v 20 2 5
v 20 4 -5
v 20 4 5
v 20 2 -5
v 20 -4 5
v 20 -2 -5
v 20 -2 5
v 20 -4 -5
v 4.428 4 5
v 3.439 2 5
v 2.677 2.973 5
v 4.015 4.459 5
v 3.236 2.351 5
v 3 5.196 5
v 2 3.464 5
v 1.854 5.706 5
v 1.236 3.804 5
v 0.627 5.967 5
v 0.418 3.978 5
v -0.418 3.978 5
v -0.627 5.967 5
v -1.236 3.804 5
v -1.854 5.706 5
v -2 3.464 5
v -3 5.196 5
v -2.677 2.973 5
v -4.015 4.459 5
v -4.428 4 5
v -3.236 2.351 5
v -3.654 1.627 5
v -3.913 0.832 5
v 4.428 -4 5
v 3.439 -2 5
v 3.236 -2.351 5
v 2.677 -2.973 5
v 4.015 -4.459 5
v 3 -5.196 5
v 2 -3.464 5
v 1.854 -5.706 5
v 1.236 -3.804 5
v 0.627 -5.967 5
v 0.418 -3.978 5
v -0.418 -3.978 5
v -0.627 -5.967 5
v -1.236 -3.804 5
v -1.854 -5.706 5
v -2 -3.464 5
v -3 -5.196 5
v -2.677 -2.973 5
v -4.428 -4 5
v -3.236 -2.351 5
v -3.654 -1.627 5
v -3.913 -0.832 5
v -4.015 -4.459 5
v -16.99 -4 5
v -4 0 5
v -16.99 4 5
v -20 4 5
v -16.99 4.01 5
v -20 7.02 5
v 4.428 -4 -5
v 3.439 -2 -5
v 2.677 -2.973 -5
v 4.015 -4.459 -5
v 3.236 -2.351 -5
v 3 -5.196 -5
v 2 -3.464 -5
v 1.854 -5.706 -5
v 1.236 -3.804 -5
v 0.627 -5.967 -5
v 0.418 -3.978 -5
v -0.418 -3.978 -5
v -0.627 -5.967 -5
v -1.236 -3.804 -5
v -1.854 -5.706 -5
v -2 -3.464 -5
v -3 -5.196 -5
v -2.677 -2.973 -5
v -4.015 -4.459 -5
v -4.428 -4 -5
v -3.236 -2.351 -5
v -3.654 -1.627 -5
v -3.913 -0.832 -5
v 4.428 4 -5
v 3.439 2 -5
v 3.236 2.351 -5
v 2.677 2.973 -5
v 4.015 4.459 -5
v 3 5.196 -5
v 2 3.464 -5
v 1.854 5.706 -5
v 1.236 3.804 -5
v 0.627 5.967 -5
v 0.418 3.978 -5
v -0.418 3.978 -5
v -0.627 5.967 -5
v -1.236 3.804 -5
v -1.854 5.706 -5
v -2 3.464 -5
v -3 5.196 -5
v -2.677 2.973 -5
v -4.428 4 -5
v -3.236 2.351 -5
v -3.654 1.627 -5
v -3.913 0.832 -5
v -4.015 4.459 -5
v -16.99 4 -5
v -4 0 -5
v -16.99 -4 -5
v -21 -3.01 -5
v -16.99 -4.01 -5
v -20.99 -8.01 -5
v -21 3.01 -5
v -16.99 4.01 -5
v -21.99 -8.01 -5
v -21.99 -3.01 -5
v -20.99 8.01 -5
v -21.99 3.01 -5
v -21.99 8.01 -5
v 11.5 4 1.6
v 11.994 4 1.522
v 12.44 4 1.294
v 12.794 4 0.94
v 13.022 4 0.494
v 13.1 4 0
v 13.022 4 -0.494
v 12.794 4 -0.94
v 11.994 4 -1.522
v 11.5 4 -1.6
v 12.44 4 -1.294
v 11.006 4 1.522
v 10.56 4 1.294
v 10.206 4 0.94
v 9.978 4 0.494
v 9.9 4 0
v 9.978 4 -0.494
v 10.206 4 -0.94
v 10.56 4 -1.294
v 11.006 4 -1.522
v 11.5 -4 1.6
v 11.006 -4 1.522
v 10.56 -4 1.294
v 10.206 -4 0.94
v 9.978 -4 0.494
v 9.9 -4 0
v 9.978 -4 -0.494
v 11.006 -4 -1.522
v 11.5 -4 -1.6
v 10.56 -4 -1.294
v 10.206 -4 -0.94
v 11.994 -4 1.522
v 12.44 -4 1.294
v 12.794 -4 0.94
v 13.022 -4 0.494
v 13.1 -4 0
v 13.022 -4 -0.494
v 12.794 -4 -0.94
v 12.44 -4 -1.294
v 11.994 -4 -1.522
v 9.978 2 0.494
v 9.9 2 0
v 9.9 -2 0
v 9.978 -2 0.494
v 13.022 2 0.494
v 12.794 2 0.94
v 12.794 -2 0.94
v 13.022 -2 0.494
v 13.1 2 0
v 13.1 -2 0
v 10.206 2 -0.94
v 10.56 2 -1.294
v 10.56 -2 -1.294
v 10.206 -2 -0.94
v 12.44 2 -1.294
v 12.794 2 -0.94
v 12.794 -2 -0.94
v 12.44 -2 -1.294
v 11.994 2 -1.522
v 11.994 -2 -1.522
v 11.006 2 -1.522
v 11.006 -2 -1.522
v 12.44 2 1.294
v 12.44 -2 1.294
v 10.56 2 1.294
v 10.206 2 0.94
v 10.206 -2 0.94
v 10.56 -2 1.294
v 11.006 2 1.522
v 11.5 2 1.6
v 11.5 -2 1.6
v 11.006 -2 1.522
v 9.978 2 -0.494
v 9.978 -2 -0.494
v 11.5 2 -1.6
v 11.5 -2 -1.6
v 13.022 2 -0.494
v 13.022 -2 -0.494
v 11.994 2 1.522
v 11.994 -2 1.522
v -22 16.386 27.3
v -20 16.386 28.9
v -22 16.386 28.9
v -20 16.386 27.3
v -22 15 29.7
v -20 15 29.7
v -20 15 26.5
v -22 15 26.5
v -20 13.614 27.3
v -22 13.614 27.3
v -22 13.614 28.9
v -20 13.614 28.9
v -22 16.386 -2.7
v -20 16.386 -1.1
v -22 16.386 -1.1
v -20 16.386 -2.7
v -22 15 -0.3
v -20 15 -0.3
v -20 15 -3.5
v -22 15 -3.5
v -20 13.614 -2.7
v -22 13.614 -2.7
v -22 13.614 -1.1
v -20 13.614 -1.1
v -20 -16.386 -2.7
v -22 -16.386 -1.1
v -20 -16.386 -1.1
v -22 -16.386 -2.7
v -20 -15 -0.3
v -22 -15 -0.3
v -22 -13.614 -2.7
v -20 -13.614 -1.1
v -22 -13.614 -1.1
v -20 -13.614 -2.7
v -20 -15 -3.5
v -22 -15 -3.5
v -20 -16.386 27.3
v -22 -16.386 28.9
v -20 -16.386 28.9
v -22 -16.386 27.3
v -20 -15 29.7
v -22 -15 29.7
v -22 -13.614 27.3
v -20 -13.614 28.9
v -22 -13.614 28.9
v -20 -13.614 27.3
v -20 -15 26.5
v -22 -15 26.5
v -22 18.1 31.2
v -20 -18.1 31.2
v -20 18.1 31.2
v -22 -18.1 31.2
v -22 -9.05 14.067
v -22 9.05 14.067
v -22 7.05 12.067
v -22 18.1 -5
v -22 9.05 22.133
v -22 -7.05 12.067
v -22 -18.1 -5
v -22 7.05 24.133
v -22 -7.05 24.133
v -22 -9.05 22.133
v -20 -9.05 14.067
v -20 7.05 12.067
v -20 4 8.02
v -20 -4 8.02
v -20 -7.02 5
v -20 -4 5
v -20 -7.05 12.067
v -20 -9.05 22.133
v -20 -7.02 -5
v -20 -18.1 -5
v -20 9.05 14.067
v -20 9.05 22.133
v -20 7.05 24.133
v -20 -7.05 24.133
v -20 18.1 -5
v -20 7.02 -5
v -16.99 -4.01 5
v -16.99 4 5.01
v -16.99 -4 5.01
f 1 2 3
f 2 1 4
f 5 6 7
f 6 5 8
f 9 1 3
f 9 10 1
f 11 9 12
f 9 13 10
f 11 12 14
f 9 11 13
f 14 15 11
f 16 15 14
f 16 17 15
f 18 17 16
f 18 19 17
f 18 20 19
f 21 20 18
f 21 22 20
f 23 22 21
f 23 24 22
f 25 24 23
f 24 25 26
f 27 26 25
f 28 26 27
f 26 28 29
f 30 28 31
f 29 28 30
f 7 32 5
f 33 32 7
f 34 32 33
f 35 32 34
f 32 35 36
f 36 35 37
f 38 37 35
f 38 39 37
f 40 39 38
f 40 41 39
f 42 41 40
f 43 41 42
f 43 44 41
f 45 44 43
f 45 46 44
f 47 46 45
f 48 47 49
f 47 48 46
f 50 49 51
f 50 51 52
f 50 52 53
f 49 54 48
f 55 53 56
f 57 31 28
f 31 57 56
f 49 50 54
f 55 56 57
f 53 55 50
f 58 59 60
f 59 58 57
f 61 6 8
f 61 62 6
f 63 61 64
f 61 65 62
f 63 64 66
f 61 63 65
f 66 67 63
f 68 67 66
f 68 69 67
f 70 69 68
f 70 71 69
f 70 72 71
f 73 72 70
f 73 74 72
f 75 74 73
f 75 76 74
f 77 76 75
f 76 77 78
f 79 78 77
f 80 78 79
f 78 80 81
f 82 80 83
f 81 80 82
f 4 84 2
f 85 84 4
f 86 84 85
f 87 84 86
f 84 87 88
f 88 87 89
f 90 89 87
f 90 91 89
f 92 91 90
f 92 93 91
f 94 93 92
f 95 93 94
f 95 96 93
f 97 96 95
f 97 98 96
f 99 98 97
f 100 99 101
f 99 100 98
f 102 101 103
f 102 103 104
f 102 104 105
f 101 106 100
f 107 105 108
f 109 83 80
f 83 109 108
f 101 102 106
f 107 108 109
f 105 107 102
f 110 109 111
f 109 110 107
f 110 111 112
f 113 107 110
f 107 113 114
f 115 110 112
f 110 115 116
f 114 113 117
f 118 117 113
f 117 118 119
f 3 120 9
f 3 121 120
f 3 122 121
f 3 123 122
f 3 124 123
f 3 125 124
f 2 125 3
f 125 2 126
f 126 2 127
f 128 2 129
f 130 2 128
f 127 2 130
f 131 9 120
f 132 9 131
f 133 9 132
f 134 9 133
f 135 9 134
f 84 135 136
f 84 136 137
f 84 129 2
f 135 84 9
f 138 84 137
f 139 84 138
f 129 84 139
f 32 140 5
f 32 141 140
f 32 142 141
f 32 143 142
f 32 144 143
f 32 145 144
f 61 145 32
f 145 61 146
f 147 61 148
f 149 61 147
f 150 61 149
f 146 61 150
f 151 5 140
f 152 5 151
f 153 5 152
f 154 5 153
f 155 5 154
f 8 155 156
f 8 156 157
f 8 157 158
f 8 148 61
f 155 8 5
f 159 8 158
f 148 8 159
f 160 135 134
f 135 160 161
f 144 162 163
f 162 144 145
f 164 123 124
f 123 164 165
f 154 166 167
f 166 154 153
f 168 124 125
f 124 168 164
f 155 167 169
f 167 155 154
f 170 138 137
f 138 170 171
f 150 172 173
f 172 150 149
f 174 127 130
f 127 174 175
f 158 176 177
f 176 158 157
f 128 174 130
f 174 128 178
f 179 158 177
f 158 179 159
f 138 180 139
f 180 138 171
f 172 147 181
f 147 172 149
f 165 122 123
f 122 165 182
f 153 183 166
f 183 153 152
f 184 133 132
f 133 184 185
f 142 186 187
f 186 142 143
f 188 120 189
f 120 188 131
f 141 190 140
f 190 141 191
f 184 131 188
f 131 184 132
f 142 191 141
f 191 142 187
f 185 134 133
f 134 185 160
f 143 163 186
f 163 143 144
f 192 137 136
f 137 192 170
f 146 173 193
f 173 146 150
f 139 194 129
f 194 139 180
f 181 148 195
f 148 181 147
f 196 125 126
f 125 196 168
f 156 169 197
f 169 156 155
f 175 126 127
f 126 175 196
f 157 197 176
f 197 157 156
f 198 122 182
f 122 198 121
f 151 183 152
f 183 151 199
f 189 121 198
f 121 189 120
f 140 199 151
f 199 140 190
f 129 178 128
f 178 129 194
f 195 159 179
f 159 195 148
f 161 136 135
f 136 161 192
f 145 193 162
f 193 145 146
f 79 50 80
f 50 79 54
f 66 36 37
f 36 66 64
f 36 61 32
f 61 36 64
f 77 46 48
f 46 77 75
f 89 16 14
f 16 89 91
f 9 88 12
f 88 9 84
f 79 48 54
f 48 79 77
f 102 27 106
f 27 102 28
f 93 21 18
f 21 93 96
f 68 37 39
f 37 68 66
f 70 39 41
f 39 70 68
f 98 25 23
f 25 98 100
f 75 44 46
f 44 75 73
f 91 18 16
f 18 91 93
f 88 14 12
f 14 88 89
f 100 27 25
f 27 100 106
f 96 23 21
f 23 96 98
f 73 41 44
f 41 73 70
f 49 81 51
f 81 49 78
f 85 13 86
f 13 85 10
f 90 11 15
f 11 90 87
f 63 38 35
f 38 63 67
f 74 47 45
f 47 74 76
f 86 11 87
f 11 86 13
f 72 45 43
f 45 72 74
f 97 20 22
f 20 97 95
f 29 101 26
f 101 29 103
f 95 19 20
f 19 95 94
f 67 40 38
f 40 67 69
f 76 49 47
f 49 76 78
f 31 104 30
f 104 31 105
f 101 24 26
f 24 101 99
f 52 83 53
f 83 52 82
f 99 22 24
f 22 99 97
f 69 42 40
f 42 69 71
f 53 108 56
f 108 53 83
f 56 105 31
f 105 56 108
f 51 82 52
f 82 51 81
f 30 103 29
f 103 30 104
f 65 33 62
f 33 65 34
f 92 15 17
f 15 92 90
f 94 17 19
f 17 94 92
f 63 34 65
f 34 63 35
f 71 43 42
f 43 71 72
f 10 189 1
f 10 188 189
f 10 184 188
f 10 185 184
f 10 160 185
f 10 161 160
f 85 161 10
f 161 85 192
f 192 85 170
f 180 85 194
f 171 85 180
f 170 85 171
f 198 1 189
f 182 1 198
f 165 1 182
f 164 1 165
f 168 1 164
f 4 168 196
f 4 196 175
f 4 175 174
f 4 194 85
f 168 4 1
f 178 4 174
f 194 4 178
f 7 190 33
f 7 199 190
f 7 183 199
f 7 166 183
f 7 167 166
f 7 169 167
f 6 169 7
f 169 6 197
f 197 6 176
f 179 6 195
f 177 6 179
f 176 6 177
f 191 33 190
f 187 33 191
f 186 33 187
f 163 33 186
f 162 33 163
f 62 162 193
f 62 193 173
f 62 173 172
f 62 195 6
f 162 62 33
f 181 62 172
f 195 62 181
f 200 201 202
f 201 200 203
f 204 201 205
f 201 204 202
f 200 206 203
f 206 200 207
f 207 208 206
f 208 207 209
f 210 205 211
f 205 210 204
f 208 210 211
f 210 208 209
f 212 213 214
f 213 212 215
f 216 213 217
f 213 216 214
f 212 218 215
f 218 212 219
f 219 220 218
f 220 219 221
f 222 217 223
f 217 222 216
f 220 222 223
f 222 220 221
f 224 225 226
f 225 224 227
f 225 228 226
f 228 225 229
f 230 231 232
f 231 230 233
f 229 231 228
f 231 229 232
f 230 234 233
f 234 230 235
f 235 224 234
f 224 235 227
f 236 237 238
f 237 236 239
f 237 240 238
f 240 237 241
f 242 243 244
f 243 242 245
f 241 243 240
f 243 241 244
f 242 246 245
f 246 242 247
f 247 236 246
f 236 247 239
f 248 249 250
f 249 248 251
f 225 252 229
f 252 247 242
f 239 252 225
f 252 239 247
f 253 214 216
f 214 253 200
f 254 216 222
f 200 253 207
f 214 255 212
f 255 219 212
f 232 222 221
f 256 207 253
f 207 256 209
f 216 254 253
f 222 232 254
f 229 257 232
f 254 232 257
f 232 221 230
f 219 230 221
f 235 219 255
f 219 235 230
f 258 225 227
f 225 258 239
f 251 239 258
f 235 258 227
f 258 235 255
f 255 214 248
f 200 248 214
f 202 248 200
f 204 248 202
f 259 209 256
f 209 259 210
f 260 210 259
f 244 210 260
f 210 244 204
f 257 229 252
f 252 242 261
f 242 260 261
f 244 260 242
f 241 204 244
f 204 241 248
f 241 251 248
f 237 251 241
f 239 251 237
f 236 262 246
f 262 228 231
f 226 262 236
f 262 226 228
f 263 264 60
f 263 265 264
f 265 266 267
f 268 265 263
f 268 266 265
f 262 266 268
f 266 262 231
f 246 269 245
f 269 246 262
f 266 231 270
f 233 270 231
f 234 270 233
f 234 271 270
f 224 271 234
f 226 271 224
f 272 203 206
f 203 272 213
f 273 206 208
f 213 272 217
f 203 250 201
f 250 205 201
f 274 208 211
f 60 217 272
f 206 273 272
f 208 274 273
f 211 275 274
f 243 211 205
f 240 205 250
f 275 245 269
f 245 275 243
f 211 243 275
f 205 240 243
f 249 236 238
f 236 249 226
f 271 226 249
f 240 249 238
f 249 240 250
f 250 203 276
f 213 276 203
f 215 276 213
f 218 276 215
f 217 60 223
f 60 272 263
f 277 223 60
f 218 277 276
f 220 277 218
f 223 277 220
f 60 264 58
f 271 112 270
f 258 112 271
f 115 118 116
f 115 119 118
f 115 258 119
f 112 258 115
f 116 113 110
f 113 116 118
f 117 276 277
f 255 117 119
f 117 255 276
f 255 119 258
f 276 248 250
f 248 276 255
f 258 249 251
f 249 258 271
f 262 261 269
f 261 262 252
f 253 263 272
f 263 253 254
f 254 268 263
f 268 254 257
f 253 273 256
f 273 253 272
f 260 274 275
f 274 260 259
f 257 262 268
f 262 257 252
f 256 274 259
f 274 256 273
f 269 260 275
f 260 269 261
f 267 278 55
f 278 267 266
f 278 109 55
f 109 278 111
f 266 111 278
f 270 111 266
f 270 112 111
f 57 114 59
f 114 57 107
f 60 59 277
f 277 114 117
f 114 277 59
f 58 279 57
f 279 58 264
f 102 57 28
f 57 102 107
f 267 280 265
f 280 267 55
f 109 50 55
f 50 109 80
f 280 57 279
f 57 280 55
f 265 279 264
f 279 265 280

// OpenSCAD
// file: obiscad/attach.scad
//---------------------------------------------------------------
//-- Openscad Attachment library
//-- Attach parts easily. Make your designs more reusable and clean
//---------------------------------------------------------------
//-- This is a component of the obiscad opescad tools by Obijuan
//-- (C) Juan Gonzalez-Gomez (Obijuan)
//-- Sep-2012
//---------------------------------------------------------------
//-- Released under the GPL license
//---------------------------------------------------------------

use <vector.scad>

//--------------------------------------------------------------------
//-- Draw a connector
//-- A connector is defined a 3-tuple that consist of a point
//--- (the attachment point), and axis (the attachment axis) and
//--- an angle the connected part should be rotate around the 
//--  attachment axis
//--
//--- Input parameters:
//--
//--  Connector c = [p , n, ang] where:
//--
//--     p : The attachment point
//--     v : The attachment axis
//--   ang : the angle
//--------------------------------------------------------------------
module connector(c)
{
  //-- Get the three components from the connector
  p = c[0];
  v = c[1];
  ang = c[2];

  //-- Draw the attachment poing
  color("Gray") point(p);

  //-- Draw the attachment axis vector (with a mark)
  translate(p)
    rotate(a=ang, v=v)
    color("Gray") vector(unitv(v)*6, l_arrow=2, mark=true);
}


//-------------------------------------------------------------------------
//--  ATTACH OPERATOR
//--  This operator applies the necesary transformations to the 
//--  child (attachable part) so that it is attached to the main part
//--  
//--  Parameters
//--    a -> Connector of the main part
//--    b -> Connector of the attachable part
//-------------------------------------------------------------------------
module attach(a,b)
{
  //-- Get the data from the connectors
  pos1 = a[0];  //-- Attachment point. Main part
  v    = a[1];  //-- Attachment axis. Main part
  roll = a[2];  //-- Rolling angle
  
  pos2 = b[0];  //-- Attachment point. Attachable part
  vref = b[1];  //-- Atachment axis. Attachable part
                //-- The rolling angle of the attachable part is not used

  //-------- Calculations for the "orientate operator"------
  //-- Calculate the rotation axis
  raxis = cross(vref,v);
    
  //-- Calculate the angle between the vectors
  ang = anglev(vref,v);
  //--------------------------------------------------------.-

  //-- Apply the transformations to the child ---------------------------

  //-- Place the attachable part on the main part attachment point
  translate(pos1)
    //-- Orientate operator. Apply the orientation so that
    //-- both attachment axis are paralell. Also apply the roll angle
    rotate(a=roll, v=v)  rotate(a=ang, v=raxis)
      //-- Attachable part to the origin
      translate(-pos2)
	child(0); 
}


//--------------------------------------------------------------------
//---   An example of the attach operator
//---  
//---  There are two parts: the main body and an arm
//---  They both are cubes (for simplicity)
//---
//--   In the main body there are 2 connectors defined, so that
//--  the arm can be attached to any of them (or both if you like)
//------------------------------------------------------------------

//-- In the debug mode the connectors and additional information
//-- are shown
debug=true;

//-- Define the Main part: A cube
//-- Two attachment points are defined: one on the top, another in the
//--- left side
size = [10,10,10];

//-- Connectors defined:

//--     Att. point       Att. Axis  Roll
c1 = [ [0,0,size[2]/2],  [0,0,1],     20];  //-- Connector on the top
c2 = [ [-size[0]/2,0,0], [-1,0,0],    90];  //-- Connector on the left


//-- Draw the main part along with the connectors (for debugging)
cube(size,center=true);

//-- In debug mode: Draw the main part connectors!
if (debug) {
  connector(c1);
  connector(c2);
}

//-- Define the Attachable part. It is another cube, with one connector
asize = [5,20,3];
a = [ [0,asize[1]/2-3,-asize[2]/2], [0,0,1], 0  ];


//-- Do the attach!
//-- Just change c1 by c2 to attach the part to the other 
//-- connector. Super-easy!! :-)
//-- Modify the c1 and c2 roll angle for rotating the attachable
//--  part to the desired orientation
attach(c1,a)
  //-- This is the attachable part! 
  union() {
    cube(asize,center=true);  //-- The part

    //-- In debug mode show additional info:
    if (debug) {
      frame(l=10);    //-- The part frame of reference.
      connector(a);   //-- Show the part connector
    }
  };

  
// file: obiscad/bcube.scad
//------------------------------------------------------------------------------
//  Bevel edge cube.
//  (c) Juan Gonzalez-Gomez (Obijuan), Sep-2012
//------------------------------------------------------------------------------

//----------------- IMPLEMENTATION USING THE MINKOWSKI OPERATOR ----------------

//------------------------------------------------------------------------------
//-- Bevel Cube main function
//-- Parameters:
//--   * Size:  Cube size
//--   * cr : Corner radius (if cr==0, a standar cube is built)
//--   * cres:  Corner resolution (in points). cres=0 means flat corners
//------------------------------------------------------------------------------
module bcube(size,cr=0,cres=0)
{
  //-- Internal cube size
  bsize = size - 2*[cr,cr,0];

  //-- Get the (x,y) coorner coordinates in the 1st cuadrant
  x = bsize[0]/2;
  y = bsize[1]/2;

  //-- A corner radius of 0 means a standar cube!
  if (cr==0)
    cube(bsize,center=true);
  else {

      
      //-- The height of minkowski object is double. So
      //-- we sould scale by 0.5
      scale([1,1,0.5])

      //-- This translation is for centering the minkowski objet
      translate([-x, -y,0])

      //-- Built the  beveled cube with minkowski
      minkowski() {

        //-- Internal cube
        cube(bsize,center=true);

        //-- Cylinder in the corner (1st cuadrant)
        translate([x,y, 0])
          cylinder(r=cr, h=bsize[2],center=true, $fn=4*(cres+1));
      }
  }

}


//-- Examples of use of the bcube() module

//-- Standar cube
translate([-15,15,0])
bcube([20,20,10]);

//-- Beveled cube (0 point resolution)
translate([15,15,0])
  bcube([20,20,10],cr=4);

//-- Beveled cube (1 point resolution)
translate([-15,-15,0])
  bcube([20,20,10],cr=4, cres=1);

//-- Beveled cube (4 points resolution)
translate([15,-15,0])
  bcube([20,20,10],cr=4, cres=4);
// file: obiscad/utils.scad
//---------------------------------------------------------------
//-- Utils. General utilities...
//-- This is a component of the obiscad opescad tools by Obijuan
//-- (C) Juan Gonzalez-Gomez (Obijuan)
//-- Sep-2012
//---------------------------------------------------------------
//-- Released under the GPL license
//---------------------------------------------------------------

//-----------------------------------------------------
//-- Functions for converting a scalar into a vector:
//-----------------------------------------------------
//-- The scalar is interpreted as the x coordinate
function VX(x) = [x,0,0];

//-- The scalar is interpreted as the y coordinate
function VY(y) = [0,y,0];

//-- The scalar is interpreted as the z coordinate
function VZ(z) = [0,0,z];


//-----------------------------------------
//-- Definition for accessing vector componentes easily
//--------------------------------------------------------
X = 0;
Y = 1;
Z = 2;
// main file
include <obiscad/utils.scad>
use <obiscad/bcube.scad>
use <obiscad/attach.scad>
use <obiscad/bevel.scad>


//-- Pen-holder
pen_diam = 8;
pen_wrap_th = 2;
pen_hi = 10;
clamp_empty = 4;
clamp_lx = 15;
clamp_drill = 3.2;

//------------------------------ Pen-arm --------------------
pen_arm_lx = 20;

//-- INTERFACE: Radial distance of drills
fp_drills_distance = 6;

//-- Drills diameter
fp_drills_diam = 3.2;

pen_base_th = 4;

reinforce_cr = 4;
reinforce_cres = 0;

//----- Skymega drills  ----------------------
sky_dd = 15; //-- Distance
sky_drill_diam = 3.2; //-- Drill diam

//--- Create the skymega drill table
sky_drill_table = [
  [sky_dd, sky_dd, 0],
  [-sky_dd, sky_dd, 0],
  [-sky_dd, -sky_dd, 0],
  [sky_dd, -sky_dd, 0],
];

//-- Connecting plate (base) for the repyz modules
plate_border_th = 3;
plate_th = 2;

plate_side = 2*sky_dd + sky_drill_diam + plate_border_th;
plate_size = [plate_side, plate_side, plate_th];

module plate() 
{

  difference() {
    //-- Plate
    cube(plate_size, center = true);
  
    //-- Skymega drills
    for (drill = sky_drill_table) {
      translate(drill)
      cylinder(r=sky_drill_diam/2, h=plate_size[Z]+extra,center=true, $fn=6);
    }
    
    //-- Cutout
    translate([5,0,0])
    bcube([plate_size[X]/3, plate_size[Y]/2, plate_size[Z]+extra], cr = 2, cres=0);
  }

}

//translate([-plate_size[Z]/2,0,0])
//rotate([0, 90, 0])
//plate();

//---- -------------------------Build the pen-holder
extra=5;

//-- Clamp
clamp_size = [clamp_lx+pen_wrap_th, clamp_empty + 2*pen_wrap_th, pen_hi];
empty_size = [clamp_size[X]+extra, clamp_empty, clamp_size[Z]+extra];

module clamp_body()
{
  difference() {
  cube(clamp_size,center=true);

    //-- Body drill
    rotate([90,0,0])
      cylinder(r=clamp_drill/2, h=clamp_size[Z]+extra, center=true, $fn=20);
  }
}

module clamp_empty_part()
{

  union() {
  //-- Pen hole and clamp empty space
  cylinder(r=pen_diam/2, h=pen_hi+extra, center=true, $fn=30);

  translate([empty_size[X]/2,0,0])
    cube(empty_size,center=true);
  }
}

a = [[(pen_diam+pen_wrap_th)/2,0,0],[1,0,0],0];
b = [[-clamp_size[X]/2+pen_wrap_th,0,0],[1,0,0],0];

//connector(a);
//connector(b);

difference() {
  union() {
    attach(a,b)
      //color("yellow",0.4)
      clamp_body();

      //-- Pen holder
      cylinder(r=(pen_diam+2*pen_wrap_th)/2, h=pen_hi, center=true, $fn=30);
    }

  clamp_empty_part();
}


//--- Pen arm
pen_arm_size = [pen_arm_lx-(pen_diam+pen_wrap_th)/2+pen_wrap_th, clamp_empty + 2*pen_wrap_th, pen_hi];

translate([-pen_arm_size[X]/2-pen_diam/2,0,0])
cube(pen_arm_size,center=true);

//-- Pen base
pen_base_size = [pen_base_th, 
		  2*fp_drills_distance + fp_drills_diam+2*pen_base_th, 
		  pen_arm_size[Z] + fp_drills_diam + 2*pen_base_th ];

module pen_base() {
  

  drills_pos =  [0,fp_drills_distance, pen_base_size[Z]/2-pen_base_th];
  drills_pos2 = [0,-fp_drills_distance, pen_base_size[Z]/2-pen_base_th ];

  difference() {
    cube(pen_base_size,center=true);

    translate(drills_pos)
      rotate([0,90,0])
	cylinder(r=fp_drills_diam/2, h=pen_base_th+extra, center=true, $fn=20);

    translate(drills_pos2)
      rotate([0,90,0])
	cylinder(r=fp_drills_diam/2, h=pen_base_th+extra, center=true, $fn=20);

  }
}

con1 = [[-pen_arm_size[X]-pen_diam/2,0, -pen_arm_size[Z]/2],[-1,0,0],0];
con2 = [[-plate_size[X]/2,0,0],[0,0,1],0];

*connector(con1);
*connector(con2);

attach(con1,con2)
  plate();

//-- Add some reinforcements
pr1 = [
  [[con1[0][X], -pen_arm_size[Y]/2,0],[0,0,1],0],
  [[con1[0][X], -pen_arm_size[Y]/2,0],[1,-1,0],0],
];

pr2 = [
  [[con1[0][X], pen_arm_size[Y]/2,0],[0,0,1],0],
  [[con1[0][X], pen_arm_size[Y]/2,0],[1,1,0],0],
];

pr3 = [
  [[con1[0][X],0,pen_arm_size[Z]/2],[0,1,0],0],
  [[con1[0][X],0,0],[1,0,1],0],
];

bconcave_corner_attach (pr1[0], pr1[1],l=pen_arm_size[Z],cr=reinforce_cr,cres=reinforce_cres);
bconcave_corner_attach (pr2[0], pr2[1],l=pen_arm_size[Z],cr=reinforce_cr,cres=reinforce_cres);
bconcave_corner_attach (pr3[0], pr3[1],l=pen_arm_size[Y],cr=reinforce_cr,cres=reinforce_cres);




    
